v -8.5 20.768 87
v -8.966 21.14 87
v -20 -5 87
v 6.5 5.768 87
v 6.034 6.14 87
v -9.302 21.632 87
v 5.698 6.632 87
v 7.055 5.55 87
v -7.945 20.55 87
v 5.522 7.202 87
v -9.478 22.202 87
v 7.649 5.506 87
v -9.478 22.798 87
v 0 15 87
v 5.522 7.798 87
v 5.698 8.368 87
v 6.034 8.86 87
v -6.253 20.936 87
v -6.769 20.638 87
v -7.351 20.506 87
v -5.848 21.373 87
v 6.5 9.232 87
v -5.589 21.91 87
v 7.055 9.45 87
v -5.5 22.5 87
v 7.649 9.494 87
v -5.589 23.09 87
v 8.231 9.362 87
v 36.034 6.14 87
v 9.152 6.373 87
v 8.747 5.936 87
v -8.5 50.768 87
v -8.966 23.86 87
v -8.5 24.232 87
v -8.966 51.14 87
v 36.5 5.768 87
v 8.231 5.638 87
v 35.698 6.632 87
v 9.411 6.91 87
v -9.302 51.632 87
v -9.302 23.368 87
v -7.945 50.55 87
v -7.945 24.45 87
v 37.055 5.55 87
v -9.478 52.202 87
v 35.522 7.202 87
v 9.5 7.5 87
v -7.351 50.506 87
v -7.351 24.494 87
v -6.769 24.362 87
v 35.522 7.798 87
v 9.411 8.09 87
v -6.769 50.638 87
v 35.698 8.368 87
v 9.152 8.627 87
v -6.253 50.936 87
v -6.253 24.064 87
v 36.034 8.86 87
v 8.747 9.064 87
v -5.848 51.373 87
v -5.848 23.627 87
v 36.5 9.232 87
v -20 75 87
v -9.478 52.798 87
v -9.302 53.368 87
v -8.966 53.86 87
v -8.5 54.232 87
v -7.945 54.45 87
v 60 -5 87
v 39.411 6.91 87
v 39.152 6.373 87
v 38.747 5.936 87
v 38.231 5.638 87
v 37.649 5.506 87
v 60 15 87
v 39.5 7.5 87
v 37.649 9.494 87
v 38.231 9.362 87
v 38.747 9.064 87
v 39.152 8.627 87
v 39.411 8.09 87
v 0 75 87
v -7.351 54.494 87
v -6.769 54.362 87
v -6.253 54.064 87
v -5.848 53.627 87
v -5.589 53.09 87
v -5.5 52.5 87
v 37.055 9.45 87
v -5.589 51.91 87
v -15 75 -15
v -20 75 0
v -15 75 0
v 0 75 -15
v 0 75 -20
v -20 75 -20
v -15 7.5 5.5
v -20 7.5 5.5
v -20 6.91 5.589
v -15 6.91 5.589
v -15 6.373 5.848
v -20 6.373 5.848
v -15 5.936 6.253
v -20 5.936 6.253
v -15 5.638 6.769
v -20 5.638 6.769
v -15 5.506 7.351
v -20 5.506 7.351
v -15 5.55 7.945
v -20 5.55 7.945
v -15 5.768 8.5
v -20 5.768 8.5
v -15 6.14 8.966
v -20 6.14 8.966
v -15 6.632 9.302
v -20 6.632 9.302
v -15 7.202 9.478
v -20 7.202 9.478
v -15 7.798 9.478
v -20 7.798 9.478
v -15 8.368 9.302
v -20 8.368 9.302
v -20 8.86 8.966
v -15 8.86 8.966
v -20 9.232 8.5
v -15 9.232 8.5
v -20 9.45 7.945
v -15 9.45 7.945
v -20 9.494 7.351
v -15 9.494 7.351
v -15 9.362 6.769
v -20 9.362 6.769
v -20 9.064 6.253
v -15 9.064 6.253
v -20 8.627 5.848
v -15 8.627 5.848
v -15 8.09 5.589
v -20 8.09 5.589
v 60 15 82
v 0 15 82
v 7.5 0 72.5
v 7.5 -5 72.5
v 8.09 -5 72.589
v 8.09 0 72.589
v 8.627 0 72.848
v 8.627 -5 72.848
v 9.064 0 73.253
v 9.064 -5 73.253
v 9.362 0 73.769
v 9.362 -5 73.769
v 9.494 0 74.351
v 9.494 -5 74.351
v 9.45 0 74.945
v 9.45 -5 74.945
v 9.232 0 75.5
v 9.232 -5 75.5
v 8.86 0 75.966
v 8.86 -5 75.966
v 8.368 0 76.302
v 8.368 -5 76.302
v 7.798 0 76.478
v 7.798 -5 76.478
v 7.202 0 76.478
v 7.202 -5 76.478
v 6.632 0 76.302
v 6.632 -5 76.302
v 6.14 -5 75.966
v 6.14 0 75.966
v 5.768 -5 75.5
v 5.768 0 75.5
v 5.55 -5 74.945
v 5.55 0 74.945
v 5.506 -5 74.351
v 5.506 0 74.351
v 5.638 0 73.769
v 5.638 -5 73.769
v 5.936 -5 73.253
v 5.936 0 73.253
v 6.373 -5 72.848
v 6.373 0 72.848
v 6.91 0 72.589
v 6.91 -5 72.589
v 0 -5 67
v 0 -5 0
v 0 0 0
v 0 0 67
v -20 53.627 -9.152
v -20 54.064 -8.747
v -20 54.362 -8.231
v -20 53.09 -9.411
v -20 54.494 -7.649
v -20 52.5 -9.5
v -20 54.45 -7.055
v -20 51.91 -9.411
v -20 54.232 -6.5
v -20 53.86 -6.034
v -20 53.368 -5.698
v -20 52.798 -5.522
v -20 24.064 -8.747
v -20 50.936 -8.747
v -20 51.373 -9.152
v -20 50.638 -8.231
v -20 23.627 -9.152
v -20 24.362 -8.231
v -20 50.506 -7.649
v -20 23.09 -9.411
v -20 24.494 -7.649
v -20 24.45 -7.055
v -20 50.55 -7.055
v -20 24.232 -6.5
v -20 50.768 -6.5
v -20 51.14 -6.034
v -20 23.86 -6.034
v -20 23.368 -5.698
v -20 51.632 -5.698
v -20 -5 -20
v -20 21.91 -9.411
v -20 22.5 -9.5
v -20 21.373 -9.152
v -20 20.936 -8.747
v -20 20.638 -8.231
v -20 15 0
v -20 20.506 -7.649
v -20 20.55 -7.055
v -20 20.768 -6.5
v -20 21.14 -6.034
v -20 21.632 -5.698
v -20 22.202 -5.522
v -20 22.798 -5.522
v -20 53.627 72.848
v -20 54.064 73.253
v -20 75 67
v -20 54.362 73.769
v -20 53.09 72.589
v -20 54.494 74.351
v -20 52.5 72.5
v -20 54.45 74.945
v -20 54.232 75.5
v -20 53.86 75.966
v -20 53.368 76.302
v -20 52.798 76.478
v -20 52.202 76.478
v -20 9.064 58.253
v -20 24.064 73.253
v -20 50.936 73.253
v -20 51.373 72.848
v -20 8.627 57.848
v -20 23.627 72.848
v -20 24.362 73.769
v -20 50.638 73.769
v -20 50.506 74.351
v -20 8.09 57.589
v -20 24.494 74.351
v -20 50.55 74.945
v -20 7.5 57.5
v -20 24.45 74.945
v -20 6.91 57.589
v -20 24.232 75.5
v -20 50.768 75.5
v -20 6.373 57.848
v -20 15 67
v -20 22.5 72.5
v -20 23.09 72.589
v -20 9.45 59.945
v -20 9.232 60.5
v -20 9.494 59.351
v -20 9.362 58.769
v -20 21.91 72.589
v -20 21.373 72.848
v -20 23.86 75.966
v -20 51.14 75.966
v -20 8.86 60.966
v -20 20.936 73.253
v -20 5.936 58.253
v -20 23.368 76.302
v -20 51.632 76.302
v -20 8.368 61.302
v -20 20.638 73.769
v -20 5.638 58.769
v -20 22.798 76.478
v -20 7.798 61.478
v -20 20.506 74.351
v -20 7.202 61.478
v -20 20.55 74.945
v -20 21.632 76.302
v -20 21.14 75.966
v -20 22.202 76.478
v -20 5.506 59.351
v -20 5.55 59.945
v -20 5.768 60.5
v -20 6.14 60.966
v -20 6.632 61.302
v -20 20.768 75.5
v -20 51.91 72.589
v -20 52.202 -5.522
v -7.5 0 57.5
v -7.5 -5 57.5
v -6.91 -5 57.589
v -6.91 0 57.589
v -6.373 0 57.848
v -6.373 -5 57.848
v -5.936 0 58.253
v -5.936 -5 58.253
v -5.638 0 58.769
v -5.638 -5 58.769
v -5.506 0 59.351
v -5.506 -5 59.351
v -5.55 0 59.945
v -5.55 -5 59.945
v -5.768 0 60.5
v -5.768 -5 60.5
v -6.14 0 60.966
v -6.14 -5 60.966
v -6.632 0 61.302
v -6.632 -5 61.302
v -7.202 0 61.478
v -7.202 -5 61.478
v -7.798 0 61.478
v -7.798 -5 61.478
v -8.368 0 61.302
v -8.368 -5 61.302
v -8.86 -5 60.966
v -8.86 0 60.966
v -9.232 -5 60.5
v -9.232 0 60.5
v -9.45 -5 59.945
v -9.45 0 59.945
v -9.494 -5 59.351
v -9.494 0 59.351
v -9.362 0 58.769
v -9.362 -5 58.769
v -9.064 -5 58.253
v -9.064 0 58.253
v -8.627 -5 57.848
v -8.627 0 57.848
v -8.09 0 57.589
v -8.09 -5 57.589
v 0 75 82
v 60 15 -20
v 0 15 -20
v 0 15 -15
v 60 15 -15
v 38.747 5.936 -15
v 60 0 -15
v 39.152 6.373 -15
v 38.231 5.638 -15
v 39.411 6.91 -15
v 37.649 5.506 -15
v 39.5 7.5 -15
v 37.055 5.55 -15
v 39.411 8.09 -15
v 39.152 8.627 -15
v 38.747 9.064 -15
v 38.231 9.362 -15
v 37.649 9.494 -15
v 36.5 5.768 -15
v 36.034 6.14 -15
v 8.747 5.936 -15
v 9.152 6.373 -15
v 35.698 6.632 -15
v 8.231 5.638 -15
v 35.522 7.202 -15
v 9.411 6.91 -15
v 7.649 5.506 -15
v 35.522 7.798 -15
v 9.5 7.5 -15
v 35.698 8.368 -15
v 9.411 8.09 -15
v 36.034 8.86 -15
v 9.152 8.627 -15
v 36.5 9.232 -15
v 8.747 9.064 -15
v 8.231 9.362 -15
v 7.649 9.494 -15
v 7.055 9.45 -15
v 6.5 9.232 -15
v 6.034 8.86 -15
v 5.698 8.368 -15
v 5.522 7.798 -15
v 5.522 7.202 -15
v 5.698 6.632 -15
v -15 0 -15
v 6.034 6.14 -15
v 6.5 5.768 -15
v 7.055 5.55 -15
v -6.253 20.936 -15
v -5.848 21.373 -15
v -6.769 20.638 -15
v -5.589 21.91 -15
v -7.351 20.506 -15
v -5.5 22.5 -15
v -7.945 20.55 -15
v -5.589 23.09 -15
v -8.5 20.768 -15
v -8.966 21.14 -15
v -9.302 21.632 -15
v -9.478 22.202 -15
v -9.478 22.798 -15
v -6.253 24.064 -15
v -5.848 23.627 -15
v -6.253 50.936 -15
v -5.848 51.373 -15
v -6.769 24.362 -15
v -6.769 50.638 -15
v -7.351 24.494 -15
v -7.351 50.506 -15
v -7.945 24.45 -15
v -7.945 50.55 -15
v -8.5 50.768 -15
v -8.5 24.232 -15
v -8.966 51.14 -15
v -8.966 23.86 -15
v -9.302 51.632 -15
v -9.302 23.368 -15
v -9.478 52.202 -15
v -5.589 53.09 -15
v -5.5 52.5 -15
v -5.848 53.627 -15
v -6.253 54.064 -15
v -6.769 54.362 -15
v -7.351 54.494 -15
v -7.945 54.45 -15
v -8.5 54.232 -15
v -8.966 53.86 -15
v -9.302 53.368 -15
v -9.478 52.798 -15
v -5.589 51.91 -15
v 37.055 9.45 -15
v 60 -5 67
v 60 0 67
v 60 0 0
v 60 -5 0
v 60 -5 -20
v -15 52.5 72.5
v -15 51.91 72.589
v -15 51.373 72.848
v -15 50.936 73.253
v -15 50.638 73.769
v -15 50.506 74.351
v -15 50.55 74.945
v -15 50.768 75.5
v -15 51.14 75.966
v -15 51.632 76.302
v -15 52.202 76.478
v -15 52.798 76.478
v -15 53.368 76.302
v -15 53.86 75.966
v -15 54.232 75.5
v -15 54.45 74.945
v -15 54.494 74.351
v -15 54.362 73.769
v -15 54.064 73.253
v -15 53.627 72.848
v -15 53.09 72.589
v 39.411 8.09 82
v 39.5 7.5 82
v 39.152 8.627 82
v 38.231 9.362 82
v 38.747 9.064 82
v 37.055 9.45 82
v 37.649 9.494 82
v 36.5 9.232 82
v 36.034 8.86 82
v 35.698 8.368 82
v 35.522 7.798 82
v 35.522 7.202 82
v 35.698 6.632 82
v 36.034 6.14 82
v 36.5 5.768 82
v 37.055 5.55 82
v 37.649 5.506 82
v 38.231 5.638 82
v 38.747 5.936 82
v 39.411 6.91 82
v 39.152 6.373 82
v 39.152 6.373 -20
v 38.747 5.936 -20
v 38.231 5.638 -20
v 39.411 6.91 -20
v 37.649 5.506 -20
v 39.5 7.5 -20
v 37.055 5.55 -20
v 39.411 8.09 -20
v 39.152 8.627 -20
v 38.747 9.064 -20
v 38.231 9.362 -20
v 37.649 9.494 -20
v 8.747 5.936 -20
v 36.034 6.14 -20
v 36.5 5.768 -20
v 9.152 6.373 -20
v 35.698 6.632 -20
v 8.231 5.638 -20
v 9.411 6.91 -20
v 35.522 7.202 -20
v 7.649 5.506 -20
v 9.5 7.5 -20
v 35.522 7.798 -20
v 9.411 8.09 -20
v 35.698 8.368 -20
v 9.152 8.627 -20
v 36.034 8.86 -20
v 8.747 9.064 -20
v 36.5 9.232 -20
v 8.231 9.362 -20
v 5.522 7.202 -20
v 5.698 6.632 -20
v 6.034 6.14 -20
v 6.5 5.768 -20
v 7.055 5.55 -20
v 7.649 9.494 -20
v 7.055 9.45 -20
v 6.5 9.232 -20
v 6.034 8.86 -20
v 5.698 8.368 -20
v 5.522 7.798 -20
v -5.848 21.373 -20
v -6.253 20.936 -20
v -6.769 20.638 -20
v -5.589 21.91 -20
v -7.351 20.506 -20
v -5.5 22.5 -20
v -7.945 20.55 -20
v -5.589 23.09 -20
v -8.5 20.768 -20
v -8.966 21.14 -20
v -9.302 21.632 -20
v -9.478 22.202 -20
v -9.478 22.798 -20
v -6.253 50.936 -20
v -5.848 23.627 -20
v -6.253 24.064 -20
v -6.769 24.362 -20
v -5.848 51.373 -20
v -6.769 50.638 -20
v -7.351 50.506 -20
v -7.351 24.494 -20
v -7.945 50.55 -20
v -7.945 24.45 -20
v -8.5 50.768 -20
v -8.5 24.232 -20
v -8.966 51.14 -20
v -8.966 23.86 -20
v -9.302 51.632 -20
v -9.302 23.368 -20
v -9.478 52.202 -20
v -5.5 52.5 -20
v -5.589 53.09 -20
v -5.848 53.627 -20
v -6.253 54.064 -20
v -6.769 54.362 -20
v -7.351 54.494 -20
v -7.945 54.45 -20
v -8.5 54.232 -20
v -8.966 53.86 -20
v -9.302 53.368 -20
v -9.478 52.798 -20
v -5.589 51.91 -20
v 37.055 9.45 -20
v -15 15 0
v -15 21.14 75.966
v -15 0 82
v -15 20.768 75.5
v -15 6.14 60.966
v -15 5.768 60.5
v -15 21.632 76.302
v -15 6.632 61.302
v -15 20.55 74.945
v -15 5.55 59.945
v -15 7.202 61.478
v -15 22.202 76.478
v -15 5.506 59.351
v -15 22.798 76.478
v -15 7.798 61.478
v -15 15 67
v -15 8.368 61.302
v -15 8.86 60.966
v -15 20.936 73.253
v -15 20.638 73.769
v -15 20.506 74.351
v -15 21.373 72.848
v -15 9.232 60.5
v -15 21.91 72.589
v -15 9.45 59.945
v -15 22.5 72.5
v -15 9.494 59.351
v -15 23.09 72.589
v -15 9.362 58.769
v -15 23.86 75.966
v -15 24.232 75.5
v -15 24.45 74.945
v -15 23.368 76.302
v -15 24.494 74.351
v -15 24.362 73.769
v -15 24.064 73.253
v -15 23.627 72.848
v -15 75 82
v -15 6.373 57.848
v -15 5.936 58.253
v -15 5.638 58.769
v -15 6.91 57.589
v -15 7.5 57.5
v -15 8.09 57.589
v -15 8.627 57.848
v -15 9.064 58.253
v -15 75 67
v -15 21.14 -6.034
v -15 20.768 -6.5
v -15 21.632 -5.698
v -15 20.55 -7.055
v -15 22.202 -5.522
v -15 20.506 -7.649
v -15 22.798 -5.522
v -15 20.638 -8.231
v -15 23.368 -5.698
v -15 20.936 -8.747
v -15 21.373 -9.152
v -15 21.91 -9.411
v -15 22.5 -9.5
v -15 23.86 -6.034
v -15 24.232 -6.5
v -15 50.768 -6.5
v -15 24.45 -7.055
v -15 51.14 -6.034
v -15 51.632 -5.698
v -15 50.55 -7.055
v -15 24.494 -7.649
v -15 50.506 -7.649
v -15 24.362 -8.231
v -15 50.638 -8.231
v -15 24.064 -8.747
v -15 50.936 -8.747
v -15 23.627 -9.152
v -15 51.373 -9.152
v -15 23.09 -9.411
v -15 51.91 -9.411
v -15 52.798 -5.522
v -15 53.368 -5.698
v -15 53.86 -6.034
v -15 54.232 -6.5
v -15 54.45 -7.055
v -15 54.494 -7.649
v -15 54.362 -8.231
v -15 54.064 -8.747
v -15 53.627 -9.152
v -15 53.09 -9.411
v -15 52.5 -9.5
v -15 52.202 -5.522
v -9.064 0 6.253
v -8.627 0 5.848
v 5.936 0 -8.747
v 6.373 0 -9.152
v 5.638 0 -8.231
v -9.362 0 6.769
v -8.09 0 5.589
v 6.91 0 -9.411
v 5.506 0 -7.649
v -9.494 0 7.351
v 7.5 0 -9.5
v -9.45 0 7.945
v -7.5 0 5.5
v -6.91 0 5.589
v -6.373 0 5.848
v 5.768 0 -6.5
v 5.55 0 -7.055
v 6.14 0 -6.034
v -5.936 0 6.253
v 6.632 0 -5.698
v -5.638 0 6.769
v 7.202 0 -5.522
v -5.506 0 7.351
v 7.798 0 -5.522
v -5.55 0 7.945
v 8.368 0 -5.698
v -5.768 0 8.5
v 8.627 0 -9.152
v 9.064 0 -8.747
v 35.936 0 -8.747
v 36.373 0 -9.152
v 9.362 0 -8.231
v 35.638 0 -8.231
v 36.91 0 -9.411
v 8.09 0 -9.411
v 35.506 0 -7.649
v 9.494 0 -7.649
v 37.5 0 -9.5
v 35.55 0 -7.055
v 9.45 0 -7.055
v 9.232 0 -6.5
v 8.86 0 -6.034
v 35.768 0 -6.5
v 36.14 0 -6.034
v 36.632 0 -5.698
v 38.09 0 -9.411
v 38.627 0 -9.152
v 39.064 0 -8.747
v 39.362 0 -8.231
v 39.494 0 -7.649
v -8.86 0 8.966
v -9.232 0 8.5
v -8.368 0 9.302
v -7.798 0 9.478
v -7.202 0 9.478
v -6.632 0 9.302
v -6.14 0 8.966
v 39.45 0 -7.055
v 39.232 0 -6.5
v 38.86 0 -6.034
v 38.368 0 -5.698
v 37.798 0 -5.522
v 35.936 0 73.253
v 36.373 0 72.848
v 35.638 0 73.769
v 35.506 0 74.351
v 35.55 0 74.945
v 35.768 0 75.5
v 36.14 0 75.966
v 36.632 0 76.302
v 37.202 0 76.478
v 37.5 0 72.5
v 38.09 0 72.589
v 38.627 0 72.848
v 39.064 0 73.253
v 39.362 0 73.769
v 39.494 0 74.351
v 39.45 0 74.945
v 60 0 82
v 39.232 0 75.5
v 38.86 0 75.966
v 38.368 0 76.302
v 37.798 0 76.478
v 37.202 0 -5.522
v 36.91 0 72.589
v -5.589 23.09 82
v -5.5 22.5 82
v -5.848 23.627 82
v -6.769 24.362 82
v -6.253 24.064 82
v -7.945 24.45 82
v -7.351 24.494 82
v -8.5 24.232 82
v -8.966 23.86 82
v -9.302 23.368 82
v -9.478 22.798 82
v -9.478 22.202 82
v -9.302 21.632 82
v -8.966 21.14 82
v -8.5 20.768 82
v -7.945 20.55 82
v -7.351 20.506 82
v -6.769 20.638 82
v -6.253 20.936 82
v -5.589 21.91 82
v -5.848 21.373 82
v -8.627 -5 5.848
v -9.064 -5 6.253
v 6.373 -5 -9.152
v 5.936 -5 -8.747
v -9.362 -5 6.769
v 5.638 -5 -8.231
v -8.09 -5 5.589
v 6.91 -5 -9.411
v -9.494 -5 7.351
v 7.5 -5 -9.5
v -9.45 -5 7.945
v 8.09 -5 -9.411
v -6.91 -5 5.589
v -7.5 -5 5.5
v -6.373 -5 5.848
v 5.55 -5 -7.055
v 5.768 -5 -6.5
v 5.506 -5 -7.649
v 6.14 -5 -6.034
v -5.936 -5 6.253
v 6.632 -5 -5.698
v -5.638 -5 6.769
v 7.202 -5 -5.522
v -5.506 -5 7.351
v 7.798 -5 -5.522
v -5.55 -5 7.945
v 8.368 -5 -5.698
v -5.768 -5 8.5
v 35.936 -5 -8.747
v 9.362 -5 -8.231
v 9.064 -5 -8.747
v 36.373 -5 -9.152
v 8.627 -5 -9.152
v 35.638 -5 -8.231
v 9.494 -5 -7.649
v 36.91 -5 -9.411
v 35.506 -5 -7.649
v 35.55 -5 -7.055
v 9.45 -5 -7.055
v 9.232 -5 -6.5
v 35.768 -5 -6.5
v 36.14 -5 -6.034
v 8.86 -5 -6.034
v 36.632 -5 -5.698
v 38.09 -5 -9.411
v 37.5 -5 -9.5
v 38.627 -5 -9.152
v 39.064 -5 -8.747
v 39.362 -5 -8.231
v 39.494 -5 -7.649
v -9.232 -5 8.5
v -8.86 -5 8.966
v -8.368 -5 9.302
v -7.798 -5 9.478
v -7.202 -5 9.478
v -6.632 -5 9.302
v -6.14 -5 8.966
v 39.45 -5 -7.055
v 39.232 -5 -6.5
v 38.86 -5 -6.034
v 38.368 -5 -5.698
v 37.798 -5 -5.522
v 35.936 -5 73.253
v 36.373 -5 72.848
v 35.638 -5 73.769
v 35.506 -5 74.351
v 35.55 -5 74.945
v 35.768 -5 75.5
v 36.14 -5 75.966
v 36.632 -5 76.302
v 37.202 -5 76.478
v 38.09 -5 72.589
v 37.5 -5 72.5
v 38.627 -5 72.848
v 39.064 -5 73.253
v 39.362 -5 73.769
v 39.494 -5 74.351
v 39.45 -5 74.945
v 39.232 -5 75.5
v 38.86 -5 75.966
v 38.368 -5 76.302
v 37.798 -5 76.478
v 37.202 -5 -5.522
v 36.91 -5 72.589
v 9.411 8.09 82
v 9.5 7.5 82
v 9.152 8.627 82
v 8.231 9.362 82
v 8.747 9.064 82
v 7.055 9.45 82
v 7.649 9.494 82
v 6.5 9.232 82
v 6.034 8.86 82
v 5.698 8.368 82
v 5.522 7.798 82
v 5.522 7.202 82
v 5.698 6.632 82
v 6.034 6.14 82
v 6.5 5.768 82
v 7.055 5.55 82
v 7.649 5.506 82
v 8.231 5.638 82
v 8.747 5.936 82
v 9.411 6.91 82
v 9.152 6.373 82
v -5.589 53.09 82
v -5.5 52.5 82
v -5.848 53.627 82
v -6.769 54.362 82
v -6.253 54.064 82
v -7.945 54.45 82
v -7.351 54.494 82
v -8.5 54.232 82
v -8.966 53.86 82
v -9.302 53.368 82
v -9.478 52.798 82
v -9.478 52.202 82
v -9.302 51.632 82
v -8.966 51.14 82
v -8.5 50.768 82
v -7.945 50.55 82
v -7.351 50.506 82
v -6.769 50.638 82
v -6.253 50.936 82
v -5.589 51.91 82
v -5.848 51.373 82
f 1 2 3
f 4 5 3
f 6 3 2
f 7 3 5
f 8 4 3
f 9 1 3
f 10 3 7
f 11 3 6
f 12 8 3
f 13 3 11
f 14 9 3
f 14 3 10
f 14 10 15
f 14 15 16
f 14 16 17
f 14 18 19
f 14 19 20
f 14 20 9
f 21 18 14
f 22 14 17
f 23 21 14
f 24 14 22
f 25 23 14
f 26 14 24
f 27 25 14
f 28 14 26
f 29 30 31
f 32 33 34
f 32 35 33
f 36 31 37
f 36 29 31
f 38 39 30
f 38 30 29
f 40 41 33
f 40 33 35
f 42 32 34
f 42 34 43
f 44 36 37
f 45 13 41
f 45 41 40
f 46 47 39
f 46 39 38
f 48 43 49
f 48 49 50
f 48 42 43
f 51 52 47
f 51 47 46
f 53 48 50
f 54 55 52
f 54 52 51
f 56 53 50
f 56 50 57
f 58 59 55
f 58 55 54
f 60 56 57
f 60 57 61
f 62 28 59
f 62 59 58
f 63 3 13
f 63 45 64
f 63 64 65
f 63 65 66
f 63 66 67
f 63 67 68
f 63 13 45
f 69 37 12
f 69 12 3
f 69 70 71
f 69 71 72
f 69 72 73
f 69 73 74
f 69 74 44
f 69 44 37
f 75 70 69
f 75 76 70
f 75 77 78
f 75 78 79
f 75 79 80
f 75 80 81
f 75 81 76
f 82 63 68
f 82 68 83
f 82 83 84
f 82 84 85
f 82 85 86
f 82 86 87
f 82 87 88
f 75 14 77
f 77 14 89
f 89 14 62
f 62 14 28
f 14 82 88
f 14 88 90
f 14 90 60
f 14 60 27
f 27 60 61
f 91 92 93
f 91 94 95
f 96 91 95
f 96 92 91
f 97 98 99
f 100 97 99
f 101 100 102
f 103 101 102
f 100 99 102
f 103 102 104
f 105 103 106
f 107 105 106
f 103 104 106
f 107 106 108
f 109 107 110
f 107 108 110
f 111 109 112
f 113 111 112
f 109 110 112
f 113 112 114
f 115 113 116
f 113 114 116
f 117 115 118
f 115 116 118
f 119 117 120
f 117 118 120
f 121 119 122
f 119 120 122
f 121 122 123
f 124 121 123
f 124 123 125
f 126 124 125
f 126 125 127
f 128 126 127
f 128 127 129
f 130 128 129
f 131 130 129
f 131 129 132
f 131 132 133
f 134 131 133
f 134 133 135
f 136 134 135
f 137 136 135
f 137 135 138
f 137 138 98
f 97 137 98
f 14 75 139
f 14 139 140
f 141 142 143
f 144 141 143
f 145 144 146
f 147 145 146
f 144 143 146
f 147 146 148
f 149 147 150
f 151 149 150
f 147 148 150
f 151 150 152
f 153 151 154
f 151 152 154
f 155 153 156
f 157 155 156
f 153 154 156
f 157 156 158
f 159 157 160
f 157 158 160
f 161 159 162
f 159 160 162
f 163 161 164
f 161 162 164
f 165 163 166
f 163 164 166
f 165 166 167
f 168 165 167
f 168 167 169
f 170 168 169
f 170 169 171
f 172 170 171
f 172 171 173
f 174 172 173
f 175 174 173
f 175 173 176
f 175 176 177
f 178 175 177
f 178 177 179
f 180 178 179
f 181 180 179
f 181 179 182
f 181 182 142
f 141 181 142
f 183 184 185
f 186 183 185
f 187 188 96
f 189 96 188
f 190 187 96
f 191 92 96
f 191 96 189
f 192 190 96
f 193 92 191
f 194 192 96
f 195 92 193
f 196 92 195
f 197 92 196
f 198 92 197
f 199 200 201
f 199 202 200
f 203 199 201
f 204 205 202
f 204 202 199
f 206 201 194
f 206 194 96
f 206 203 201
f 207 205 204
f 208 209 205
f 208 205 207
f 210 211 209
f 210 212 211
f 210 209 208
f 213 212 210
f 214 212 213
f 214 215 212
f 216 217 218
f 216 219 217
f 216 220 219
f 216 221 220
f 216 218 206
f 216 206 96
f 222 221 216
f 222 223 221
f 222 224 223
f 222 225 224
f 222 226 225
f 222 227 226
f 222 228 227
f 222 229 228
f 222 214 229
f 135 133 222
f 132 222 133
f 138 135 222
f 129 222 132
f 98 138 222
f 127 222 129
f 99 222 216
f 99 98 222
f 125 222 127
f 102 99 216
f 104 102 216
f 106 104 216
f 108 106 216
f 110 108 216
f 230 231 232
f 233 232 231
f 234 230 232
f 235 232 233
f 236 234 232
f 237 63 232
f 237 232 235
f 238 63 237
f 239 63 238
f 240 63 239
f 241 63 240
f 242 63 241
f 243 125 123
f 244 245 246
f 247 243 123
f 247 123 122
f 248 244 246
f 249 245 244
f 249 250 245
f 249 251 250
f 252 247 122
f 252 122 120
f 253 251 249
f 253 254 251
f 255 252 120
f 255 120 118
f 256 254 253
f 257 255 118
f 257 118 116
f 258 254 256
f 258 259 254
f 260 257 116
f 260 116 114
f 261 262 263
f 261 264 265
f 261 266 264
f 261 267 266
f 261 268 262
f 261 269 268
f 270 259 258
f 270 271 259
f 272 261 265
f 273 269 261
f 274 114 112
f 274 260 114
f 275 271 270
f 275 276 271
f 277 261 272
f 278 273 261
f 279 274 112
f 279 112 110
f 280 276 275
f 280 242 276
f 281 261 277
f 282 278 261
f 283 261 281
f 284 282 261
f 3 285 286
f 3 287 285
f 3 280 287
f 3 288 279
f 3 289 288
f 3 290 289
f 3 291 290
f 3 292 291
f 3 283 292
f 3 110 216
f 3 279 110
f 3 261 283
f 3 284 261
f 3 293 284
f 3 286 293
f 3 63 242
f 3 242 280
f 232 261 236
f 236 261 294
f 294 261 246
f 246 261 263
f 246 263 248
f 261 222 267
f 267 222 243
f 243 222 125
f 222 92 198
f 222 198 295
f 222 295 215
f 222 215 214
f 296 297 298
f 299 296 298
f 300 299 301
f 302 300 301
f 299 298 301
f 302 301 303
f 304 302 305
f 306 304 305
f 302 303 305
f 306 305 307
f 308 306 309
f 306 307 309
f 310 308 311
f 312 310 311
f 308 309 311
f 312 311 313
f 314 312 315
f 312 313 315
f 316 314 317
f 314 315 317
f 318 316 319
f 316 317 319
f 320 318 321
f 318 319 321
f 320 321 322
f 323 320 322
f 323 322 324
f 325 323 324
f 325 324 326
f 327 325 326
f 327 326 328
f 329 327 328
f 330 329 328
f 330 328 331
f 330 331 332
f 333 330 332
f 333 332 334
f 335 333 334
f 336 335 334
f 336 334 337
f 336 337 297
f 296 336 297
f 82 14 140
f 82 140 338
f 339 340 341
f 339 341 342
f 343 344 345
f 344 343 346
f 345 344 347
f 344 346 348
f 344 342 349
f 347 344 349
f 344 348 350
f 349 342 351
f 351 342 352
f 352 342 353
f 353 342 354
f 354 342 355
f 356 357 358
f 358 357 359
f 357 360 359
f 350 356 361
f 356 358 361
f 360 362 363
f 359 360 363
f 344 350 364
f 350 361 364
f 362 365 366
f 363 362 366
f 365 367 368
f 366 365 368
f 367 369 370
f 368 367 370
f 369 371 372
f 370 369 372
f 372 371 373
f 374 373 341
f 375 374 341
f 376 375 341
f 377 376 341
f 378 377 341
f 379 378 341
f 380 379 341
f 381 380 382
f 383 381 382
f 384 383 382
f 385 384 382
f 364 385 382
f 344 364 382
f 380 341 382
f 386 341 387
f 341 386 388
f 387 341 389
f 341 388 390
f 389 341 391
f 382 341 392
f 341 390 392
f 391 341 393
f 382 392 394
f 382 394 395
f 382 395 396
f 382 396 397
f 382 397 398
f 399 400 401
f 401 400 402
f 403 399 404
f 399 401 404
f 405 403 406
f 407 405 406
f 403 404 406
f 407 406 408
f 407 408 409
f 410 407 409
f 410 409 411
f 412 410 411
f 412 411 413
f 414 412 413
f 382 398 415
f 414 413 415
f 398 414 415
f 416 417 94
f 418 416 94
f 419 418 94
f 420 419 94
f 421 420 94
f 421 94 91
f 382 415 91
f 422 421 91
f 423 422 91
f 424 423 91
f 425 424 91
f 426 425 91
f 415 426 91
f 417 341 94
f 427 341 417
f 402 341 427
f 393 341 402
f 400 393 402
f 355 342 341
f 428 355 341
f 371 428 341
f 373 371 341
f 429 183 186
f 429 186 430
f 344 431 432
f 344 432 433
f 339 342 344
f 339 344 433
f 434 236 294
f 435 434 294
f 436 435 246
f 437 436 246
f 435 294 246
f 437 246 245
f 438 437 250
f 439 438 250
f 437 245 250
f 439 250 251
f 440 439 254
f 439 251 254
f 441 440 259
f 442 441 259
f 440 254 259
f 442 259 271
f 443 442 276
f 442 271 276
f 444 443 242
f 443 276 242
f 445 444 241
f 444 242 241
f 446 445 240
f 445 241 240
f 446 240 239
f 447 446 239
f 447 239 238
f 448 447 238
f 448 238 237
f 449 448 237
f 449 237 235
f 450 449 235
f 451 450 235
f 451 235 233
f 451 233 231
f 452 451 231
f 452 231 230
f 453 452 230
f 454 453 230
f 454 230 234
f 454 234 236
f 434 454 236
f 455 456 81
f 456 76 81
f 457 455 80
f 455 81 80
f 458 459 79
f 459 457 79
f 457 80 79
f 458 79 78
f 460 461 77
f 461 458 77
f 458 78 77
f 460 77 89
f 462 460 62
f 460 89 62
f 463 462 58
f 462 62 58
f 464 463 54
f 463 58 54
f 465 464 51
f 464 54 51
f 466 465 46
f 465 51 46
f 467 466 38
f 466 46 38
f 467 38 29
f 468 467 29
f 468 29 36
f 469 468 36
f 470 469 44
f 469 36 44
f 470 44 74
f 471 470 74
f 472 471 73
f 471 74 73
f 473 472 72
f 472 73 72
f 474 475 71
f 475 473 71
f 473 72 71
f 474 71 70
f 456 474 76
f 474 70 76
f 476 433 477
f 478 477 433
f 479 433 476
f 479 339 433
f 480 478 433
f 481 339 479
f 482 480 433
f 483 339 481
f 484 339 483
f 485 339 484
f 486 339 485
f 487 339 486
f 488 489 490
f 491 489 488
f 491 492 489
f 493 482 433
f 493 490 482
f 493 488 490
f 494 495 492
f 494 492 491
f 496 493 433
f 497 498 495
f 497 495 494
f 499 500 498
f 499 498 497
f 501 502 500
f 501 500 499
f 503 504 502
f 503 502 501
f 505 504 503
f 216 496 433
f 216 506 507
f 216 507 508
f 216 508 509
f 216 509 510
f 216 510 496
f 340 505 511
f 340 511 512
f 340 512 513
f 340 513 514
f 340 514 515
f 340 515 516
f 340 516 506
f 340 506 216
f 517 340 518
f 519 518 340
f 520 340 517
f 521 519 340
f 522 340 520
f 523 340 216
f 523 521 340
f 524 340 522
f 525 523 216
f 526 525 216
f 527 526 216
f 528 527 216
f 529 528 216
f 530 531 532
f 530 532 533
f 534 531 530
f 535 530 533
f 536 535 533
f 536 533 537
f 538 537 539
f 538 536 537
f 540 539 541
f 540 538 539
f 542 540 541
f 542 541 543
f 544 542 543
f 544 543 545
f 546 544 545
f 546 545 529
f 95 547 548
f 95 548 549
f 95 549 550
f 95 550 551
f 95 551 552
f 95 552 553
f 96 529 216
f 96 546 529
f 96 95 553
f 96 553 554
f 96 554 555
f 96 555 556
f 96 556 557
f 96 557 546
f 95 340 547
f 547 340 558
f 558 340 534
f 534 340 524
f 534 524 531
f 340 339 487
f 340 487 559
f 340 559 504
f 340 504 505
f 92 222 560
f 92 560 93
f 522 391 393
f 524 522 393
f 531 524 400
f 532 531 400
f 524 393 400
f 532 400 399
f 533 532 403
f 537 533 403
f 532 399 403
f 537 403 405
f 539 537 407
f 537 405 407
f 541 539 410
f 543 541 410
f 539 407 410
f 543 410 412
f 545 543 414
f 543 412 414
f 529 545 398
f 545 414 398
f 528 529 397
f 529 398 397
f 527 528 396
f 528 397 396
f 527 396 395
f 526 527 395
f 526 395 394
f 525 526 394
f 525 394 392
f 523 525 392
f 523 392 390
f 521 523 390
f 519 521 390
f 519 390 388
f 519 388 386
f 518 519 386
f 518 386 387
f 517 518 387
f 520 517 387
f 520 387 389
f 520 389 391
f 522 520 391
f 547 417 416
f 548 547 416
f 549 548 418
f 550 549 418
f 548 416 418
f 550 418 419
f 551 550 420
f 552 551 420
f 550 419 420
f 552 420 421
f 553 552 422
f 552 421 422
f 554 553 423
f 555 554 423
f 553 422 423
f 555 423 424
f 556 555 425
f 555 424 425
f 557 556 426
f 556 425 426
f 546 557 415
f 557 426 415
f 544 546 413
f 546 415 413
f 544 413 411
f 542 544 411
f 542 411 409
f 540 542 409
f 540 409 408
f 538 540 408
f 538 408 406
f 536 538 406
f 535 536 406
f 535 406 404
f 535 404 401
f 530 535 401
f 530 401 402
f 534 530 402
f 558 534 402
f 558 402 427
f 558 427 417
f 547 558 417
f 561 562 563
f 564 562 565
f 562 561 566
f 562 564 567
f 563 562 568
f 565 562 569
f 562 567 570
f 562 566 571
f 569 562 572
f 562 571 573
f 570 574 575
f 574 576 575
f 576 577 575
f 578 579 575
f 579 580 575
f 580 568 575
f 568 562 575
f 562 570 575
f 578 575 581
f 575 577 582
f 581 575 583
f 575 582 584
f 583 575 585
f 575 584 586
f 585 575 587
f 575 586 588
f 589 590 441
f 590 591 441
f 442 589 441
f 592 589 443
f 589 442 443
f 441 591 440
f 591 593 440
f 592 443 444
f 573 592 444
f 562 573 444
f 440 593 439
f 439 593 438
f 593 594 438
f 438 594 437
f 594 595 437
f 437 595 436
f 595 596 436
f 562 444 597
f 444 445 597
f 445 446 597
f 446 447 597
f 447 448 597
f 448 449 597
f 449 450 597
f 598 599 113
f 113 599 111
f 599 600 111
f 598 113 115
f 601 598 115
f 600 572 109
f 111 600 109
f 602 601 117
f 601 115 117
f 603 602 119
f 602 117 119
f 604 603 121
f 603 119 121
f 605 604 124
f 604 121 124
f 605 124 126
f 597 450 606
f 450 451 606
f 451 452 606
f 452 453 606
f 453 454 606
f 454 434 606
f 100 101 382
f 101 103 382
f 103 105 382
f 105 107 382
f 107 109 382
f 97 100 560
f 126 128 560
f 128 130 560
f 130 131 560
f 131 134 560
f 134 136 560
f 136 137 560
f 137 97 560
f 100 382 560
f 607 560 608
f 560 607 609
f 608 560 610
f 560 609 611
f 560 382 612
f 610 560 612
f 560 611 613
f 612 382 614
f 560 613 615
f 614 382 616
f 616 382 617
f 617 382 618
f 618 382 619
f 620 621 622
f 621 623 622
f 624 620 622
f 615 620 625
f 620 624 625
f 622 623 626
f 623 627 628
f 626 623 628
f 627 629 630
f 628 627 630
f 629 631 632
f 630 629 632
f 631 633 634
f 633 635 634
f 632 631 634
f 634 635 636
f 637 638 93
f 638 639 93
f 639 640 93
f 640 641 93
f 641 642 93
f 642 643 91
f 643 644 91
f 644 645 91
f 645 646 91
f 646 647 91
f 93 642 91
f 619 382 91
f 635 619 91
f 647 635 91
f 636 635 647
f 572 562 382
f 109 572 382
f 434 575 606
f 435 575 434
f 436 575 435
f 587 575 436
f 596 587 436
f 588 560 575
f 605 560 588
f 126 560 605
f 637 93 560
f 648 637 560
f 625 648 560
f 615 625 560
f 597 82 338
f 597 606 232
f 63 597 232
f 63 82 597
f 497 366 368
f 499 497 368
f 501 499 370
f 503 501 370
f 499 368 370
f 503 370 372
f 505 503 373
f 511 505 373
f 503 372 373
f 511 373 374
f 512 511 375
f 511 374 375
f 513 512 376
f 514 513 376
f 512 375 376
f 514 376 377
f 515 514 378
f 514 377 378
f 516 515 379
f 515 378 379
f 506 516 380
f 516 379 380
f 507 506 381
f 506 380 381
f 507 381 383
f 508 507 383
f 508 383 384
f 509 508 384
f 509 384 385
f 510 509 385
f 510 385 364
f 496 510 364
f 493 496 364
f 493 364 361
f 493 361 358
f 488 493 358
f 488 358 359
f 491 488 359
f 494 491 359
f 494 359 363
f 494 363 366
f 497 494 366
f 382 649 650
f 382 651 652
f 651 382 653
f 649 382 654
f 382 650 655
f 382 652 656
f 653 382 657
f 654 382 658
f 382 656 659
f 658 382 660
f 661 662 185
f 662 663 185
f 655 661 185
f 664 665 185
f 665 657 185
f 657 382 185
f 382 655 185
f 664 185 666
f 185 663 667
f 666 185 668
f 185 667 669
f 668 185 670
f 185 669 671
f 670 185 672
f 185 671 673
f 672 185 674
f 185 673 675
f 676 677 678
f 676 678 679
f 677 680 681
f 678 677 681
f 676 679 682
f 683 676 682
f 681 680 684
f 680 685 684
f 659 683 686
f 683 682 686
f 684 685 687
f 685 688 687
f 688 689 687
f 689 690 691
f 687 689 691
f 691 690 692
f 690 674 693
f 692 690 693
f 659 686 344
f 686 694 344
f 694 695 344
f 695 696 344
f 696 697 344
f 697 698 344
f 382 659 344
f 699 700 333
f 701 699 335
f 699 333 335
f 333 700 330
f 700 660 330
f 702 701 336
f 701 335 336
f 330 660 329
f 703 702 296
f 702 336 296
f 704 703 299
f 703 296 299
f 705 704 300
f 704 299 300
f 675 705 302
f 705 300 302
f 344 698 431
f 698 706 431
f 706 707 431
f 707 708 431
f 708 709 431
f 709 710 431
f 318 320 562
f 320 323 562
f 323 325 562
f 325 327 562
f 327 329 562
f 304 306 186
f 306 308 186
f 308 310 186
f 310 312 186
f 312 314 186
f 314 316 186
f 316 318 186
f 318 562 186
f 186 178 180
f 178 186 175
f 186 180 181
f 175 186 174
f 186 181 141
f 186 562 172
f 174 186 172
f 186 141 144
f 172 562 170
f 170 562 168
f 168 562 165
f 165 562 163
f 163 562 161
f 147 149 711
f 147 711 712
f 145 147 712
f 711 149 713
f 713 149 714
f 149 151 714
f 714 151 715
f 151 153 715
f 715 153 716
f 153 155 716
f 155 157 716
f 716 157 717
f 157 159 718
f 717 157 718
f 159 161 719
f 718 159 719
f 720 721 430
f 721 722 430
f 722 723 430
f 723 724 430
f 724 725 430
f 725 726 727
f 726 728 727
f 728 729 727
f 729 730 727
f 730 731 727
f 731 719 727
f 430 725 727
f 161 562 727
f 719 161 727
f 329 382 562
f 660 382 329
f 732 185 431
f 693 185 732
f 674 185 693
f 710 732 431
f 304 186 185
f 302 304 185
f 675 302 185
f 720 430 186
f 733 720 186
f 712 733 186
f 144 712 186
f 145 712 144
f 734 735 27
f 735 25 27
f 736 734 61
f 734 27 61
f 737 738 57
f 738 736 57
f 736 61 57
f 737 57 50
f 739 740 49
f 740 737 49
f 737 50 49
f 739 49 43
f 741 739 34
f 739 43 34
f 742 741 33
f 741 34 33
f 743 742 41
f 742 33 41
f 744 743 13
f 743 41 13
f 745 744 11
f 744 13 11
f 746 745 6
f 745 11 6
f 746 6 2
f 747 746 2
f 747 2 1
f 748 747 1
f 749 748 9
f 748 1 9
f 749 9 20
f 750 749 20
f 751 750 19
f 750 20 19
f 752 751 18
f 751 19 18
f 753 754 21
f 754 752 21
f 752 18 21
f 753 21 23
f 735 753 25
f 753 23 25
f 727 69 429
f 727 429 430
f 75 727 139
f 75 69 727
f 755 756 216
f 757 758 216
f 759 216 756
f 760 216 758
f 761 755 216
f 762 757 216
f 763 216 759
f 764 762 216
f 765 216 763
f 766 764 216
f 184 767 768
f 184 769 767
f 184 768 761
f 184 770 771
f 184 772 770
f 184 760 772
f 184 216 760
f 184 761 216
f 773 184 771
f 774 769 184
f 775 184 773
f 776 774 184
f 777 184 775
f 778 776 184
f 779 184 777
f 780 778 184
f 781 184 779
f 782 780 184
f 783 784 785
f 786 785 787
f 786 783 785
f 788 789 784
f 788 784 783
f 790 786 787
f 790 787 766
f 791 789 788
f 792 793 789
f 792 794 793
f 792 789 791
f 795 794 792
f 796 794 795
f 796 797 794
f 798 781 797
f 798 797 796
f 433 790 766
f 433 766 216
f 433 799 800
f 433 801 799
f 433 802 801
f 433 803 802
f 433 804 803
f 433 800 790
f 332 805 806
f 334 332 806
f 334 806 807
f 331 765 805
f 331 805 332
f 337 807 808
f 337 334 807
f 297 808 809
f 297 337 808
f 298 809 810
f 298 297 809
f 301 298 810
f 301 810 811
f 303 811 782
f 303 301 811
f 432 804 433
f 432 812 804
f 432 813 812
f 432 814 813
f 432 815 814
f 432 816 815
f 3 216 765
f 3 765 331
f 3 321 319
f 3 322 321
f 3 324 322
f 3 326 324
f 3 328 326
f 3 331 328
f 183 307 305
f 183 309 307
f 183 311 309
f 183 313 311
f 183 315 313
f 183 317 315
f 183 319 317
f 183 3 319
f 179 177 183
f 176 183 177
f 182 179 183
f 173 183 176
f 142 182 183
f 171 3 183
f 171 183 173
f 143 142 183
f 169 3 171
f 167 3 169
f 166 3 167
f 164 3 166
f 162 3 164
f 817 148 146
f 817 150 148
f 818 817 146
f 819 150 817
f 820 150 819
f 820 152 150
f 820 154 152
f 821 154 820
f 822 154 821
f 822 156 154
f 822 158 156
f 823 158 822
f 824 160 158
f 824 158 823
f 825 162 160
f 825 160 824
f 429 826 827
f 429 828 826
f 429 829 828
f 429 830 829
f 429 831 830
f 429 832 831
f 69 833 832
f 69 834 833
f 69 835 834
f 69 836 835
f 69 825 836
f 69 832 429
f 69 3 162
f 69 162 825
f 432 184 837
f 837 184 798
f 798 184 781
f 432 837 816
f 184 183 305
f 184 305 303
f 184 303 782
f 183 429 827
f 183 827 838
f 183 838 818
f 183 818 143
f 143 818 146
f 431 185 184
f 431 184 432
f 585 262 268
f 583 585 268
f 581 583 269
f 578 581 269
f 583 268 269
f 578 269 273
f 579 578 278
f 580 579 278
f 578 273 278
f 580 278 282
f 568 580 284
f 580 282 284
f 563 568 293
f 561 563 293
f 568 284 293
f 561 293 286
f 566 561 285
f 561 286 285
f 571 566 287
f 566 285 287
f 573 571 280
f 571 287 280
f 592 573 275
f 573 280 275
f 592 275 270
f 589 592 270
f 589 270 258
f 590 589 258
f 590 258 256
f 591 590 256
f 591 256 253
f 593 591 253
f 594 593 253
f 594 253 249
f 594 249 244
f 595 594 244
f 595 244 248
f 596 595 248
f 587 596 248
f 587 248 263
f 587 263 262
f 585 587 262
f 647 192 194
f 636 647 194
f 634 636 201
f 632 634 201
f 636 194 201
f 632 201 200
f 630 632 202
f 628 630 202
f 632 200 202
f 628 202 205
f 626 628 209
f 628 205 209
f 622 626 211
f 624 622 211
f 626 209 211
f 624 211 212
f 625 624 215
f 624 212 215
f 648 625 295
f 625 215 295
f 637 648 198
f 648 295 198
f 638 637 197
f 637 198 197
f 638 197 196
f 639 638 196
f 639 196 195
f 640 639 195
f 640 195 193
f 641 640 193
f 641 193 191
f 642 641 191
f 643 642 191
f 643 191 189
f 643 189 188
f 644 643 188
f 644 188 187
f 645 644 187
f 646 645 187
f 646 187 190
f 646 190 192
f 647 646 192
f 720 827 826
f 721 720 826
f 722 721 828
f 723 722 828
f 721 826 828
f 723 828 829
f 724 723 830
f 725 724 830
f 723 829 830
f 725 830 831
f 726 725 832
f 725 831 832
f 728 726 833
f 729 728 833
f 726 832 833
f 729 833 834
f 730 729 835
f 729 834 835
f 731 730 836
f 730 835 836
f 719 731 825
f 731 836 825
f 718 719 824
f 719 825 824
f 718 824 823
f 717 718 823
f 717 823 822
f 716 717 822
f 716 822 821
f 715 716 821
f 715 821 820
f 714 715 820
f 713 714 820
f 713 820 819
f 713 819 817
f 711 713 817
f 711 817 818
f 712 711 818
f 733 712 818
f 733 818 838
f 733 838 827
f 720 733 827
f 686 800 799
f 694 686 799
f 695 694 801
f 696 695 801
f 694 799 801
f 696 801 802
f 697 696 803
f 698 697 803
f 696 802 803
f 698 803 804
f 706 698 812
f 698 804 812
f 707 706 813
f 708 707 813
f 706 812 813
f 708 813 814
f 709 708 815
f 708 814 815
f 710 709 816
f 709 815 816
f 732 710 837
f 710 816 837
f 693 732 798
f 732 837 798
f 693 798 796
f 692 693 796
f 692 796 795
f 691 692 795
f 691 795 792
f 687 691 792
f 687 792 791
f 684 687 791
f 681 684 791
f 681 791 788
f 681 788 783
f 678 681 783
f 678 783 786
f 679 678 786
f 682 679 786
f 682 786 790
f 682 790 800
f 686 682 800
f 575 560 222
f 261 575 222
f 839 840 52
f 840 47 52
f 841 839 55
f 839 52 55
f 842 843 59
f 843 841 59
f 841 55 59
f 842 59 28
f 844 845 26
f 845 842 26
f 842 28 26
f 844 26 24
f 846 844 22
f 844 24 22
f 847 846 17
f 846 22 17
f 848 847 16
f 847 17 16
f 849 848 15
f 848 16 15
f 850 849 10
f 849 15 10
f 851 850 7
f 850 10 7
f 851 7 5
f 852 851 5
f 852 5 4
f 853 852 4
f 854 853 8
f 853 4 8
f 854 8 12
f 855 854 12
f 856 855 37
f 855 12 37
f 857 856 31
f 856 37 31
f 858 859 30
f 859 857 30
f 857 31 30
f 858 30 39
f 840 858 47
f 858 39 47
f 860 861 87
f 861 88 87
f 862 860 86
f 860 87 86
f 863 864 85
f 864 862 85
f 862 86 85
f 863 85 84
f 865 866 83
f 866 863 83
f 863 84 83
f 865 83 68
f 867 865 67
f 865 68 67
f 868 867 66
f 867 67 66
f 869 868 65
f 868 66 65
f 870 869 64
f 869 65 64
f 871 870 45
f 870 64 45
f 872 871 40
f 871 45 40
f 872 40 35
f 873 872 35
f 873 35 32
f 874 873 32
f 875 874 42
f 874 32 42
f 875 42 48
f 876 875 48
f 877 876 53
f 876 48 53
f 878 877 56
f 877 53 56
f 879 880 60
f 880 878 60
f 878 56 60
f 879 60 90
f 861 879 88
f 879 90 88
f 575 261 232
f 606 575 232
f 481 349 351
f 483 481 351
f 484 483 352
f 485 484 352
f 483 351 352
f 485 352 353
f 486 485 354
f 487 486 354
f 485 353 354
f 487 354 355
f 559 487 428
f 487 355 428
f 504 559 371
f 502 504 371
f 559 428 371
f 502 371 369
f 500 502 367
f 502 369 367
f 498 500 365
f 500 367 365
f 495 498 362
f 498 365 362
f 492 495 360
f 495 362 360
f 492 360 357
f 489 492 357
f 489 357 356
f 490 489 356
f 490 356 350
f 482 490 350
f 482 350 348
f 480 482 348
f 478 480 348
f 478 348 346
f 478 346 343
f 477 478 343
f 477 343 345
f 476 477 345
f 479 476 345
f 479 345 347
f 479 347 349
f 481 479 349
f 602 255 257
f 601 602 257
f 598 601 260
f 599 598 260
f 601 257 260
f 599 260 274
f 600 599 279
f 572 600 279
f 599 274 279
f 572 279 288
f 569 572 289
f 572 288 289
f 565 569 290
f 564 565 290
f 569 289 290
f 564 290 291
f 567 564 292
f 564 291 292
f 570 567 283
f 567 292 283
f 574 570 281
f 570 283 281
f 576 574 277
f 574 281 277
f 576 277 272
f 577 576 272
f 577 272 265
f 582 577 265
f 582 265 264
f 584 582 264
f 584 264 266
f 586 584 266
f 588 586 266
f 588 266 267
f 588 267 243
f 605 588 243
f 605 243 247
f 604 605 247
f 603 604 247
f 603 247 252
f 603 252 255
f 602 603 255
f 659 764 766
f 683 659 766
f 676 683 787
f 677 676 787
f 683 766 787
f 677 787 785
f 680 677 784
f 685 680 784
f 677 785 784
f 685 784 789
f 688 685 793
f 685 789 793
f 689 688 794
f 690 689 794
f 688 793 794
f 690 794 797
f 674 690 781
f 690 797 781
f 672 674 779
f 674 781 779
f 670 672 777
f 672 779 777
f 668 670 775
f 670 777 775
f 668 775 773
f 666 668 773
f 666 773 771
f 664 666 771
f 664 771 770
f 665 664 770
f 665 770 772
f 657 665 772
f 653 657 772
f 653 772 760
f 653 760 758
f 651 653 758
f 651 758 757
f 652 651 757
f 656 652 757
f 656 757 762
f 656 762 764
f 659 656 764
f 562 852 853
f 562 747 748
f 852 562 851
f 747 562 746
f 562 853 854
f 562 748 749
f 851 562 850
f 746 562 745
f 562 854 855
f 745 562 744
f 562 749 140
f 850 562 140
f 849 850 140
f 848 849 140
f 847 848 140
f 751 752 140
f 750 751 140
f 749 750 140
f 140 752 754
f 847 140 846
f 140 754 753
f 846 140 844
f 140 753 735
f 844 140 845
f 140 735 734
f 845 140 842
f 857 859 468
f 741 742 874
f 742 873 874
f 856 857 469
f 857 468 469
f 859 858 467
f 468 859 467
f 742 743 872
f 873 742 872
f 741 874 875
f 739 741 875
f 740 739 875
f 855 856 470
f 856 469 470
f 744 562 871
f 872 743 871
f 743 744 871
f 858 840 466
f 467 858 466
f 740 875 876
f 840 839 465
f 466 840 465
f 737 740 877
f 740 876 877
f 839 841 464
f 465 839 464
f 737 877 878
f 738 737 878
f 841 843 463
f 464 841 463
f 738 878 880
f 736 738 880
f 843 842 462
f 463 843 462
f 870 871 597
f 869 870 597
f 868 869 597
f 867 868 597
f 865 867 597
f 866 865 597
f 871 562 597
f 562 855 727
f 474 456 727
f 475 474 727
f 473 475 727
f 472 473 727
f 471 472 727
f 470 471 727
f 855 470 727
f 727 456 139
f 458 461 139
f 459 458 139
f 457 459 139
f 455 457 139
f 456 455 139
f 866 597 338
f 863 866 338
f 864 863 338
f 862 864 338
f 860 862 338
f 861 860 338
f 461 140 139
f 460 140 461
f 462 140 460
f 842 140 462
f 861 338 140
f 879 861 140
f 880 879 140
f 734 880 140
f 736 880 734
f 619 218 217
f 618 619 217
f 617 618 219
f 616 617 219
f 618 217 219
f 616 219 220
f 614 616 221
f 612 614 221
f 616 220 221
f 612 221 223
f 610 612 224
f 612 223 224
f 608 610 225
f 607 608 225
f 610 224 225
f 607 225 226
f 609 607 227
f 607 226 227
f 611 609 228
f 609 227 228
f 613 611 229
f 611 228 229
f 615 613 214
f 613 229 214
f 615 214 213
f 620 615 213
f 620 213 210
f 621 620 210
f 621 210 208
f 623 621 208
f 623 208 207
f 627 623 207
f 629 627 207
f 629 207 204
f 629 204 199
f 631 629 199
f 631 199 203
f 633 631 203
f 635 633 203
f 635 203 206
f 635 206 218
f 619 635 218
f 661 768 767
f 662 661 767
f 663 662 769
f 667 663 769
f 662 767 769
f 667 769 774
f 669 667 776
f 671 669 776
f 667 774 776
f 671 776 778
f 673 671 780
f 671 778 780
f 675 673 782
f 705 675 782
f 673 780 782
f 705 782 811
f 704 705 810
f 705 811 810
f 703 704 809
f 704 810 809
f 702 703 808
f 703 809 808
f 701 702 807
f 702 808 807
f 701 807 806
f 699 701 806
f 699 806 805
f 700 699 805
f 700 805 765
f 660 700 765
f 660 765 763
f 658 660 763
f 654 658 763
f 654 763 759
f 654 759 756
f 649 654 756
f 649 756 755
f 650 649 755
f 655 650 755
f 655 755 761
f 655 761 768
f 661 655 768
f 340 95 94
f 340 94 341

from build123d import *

# Parameters (mm, degrees)
BOSS_EXTRUDE1_DEPTH             = 5
BOSS_EXTRUDE2_DEPTH             = 5
BOSS_EXTRUDE3_DEPTH             = 5
HIEGHT_EXTENSION_DEPTH          = 27
BOSS_EXTRUDE6_DEPTH             = 5
SKETCH7_W                       = 20
SKETCH7_H                       = 80
BOSS_EXTRUDE7_DEPTH             = 5
SKETCH8_W                       = 80
SKETCH8_H                       = 20
BOSS_EXTRUDE8_DEPTH             = 5
F_4_0MM_DOWEL_HOLE1_D           = 4
F_4_0MM_DOWEL_HOLE1_ON_FACE_2_D = 4
F_4_0MM_DOWEL_HOLE1_ON_FACE_3_D = 4
F_4_0MM_DOWEL_HOLE1_ON_FACE_4_D = 4


with BuildPart() as part:
    # Sketch1 → Boss-Extrude1 (new body)
    with BuildSketch(Plane(origin=(0, 0, 0), x_dir=(1, 0, 0), z_dir=(0, 1, 0))):
        Polygon((-20, 20), (-20, -60), (0, -60), (0, 0), (60, 0), (60, 20), align=None)
    extrude(amount=-BOSS_EXTRUDE1_DEPTH)

    # Sketch2 → Boss-Extrude2 (add)
    with BuildSketch(Plane.ZY.offset(20)):
        Polygon((-20, -5), (60, -5), (60, 15), (0, 15), (0, 75), (-20, 75), align=None)
    extrude(amount=-BOSS_EXTRUDE2_DEPTH)

    # Sketch3 → Boss-Extrude3 (add)
    with BuildSketch(Plane(origin=(0, 0, -20), x_dir=(-1, 0, 0), z_dir=(0, 0, -1))):
        Polygon((-60, -5), (20, -5), (20, 75), (0, 75), (0, 15), (-60, 15), align=None)
    extrude(amount=-BOSS_EXTRUDE3_DEPTH)

    # Sketch5 → hieght extension (add)
    with BuildSketch(Plane.XY.offset(60)):
        Polygon((0, 0), (-15, 0), (-15, 15), (-20, 15), (-20, -5), (0, -5), align=None)
    extrude(amount=HIEGHT_EXTENSION_DEPTH)

    # Sketch6 → Boss-Extrude6 (add)
    with BuildSketch(Plane.XY.offset(87)):
        Polygon((-20, 75), (-20, -5), (60, -5), (60, 15), (0, 15), (0, 75), align=None)
    extrude(amount=-BOSS_EXTRUDE6_DEPTH)

    # Sketch7 → Boss-Extrude7 (add)
    with BuildSketch(Plane.ZY.offset(20)):
        with Locations((77, 35)):
            Rectangle(SKETCH7_W, SKETCH7_H)
    extrude(amount=-BOSS_EXTRUDE7_DEPTH)

    # Sketch8 → Boss-Extrude8 (add)
    with BuildSketch(Plane.XZ.offset(5)):
        with Locations((20, 77)):
            Rectangle(SKETCH8_W, SKETCH8_H)
    extrude(amount=-BOSS_EXTRUDE8_DEPTH)

    # Ø4.0mm Dowel Hole1 (through all)
    with Locations(Plane(origin=(-15, 52.5, 74.5), x_dir=(0, 0, 1), z_dir=(1, 0, 0))):
        with Locations((0, 0), (0, 30), (-67, 45), (-15, 45), (-82, 30), (-82, 0)):
            Hole(F_4_0MM_DOWEL_HOLE1_D / 2)

    # Ø4.0mm Dowel Hole1 on face 2 (through all)
    with Locations(Plane(origin=(7.5, 0, 74.5), x_dir=(0, 0, 1), z_dir=(0, 1, 0))):
        with Locations((0, 0), (0, 30), (-67, -15), (-15, -15), (-82, 0), (-82, 30)):
            Hole(F_4_0MM_DOWEL_HOLE1_ON_FACE_2_D / 2)

    # Ø4.0mm Dowel Hole1 on face 3 (through all)
    with Locations(Plane(origin=(-7.5, 52.5, 82), x_dir=(-1, 0, 0), z_dir=(0, 0, -1))):
        with Locations((0, 0), (0, -30), (-15, -45), (-45, -45)):
            Hole(F_4_0MM_DOWEL_HOLE1_ON_FACE_3_D / 2)

    # Ø4.0mm Dowel Hole1 on face 4 (through all)
    with Locations(Plane(origin=(37.5, 7.5, -15), x_dir=(1, 0, 0), z_dir=(0, 0, 1))):
        with Locations((0, 0), (-30, 0), (-45, 15), (-45, 45)):
            Hole(F_4_0MM_DOWEL_HOLE1_ON_FACE_4_D / 2)


solid = part.part
